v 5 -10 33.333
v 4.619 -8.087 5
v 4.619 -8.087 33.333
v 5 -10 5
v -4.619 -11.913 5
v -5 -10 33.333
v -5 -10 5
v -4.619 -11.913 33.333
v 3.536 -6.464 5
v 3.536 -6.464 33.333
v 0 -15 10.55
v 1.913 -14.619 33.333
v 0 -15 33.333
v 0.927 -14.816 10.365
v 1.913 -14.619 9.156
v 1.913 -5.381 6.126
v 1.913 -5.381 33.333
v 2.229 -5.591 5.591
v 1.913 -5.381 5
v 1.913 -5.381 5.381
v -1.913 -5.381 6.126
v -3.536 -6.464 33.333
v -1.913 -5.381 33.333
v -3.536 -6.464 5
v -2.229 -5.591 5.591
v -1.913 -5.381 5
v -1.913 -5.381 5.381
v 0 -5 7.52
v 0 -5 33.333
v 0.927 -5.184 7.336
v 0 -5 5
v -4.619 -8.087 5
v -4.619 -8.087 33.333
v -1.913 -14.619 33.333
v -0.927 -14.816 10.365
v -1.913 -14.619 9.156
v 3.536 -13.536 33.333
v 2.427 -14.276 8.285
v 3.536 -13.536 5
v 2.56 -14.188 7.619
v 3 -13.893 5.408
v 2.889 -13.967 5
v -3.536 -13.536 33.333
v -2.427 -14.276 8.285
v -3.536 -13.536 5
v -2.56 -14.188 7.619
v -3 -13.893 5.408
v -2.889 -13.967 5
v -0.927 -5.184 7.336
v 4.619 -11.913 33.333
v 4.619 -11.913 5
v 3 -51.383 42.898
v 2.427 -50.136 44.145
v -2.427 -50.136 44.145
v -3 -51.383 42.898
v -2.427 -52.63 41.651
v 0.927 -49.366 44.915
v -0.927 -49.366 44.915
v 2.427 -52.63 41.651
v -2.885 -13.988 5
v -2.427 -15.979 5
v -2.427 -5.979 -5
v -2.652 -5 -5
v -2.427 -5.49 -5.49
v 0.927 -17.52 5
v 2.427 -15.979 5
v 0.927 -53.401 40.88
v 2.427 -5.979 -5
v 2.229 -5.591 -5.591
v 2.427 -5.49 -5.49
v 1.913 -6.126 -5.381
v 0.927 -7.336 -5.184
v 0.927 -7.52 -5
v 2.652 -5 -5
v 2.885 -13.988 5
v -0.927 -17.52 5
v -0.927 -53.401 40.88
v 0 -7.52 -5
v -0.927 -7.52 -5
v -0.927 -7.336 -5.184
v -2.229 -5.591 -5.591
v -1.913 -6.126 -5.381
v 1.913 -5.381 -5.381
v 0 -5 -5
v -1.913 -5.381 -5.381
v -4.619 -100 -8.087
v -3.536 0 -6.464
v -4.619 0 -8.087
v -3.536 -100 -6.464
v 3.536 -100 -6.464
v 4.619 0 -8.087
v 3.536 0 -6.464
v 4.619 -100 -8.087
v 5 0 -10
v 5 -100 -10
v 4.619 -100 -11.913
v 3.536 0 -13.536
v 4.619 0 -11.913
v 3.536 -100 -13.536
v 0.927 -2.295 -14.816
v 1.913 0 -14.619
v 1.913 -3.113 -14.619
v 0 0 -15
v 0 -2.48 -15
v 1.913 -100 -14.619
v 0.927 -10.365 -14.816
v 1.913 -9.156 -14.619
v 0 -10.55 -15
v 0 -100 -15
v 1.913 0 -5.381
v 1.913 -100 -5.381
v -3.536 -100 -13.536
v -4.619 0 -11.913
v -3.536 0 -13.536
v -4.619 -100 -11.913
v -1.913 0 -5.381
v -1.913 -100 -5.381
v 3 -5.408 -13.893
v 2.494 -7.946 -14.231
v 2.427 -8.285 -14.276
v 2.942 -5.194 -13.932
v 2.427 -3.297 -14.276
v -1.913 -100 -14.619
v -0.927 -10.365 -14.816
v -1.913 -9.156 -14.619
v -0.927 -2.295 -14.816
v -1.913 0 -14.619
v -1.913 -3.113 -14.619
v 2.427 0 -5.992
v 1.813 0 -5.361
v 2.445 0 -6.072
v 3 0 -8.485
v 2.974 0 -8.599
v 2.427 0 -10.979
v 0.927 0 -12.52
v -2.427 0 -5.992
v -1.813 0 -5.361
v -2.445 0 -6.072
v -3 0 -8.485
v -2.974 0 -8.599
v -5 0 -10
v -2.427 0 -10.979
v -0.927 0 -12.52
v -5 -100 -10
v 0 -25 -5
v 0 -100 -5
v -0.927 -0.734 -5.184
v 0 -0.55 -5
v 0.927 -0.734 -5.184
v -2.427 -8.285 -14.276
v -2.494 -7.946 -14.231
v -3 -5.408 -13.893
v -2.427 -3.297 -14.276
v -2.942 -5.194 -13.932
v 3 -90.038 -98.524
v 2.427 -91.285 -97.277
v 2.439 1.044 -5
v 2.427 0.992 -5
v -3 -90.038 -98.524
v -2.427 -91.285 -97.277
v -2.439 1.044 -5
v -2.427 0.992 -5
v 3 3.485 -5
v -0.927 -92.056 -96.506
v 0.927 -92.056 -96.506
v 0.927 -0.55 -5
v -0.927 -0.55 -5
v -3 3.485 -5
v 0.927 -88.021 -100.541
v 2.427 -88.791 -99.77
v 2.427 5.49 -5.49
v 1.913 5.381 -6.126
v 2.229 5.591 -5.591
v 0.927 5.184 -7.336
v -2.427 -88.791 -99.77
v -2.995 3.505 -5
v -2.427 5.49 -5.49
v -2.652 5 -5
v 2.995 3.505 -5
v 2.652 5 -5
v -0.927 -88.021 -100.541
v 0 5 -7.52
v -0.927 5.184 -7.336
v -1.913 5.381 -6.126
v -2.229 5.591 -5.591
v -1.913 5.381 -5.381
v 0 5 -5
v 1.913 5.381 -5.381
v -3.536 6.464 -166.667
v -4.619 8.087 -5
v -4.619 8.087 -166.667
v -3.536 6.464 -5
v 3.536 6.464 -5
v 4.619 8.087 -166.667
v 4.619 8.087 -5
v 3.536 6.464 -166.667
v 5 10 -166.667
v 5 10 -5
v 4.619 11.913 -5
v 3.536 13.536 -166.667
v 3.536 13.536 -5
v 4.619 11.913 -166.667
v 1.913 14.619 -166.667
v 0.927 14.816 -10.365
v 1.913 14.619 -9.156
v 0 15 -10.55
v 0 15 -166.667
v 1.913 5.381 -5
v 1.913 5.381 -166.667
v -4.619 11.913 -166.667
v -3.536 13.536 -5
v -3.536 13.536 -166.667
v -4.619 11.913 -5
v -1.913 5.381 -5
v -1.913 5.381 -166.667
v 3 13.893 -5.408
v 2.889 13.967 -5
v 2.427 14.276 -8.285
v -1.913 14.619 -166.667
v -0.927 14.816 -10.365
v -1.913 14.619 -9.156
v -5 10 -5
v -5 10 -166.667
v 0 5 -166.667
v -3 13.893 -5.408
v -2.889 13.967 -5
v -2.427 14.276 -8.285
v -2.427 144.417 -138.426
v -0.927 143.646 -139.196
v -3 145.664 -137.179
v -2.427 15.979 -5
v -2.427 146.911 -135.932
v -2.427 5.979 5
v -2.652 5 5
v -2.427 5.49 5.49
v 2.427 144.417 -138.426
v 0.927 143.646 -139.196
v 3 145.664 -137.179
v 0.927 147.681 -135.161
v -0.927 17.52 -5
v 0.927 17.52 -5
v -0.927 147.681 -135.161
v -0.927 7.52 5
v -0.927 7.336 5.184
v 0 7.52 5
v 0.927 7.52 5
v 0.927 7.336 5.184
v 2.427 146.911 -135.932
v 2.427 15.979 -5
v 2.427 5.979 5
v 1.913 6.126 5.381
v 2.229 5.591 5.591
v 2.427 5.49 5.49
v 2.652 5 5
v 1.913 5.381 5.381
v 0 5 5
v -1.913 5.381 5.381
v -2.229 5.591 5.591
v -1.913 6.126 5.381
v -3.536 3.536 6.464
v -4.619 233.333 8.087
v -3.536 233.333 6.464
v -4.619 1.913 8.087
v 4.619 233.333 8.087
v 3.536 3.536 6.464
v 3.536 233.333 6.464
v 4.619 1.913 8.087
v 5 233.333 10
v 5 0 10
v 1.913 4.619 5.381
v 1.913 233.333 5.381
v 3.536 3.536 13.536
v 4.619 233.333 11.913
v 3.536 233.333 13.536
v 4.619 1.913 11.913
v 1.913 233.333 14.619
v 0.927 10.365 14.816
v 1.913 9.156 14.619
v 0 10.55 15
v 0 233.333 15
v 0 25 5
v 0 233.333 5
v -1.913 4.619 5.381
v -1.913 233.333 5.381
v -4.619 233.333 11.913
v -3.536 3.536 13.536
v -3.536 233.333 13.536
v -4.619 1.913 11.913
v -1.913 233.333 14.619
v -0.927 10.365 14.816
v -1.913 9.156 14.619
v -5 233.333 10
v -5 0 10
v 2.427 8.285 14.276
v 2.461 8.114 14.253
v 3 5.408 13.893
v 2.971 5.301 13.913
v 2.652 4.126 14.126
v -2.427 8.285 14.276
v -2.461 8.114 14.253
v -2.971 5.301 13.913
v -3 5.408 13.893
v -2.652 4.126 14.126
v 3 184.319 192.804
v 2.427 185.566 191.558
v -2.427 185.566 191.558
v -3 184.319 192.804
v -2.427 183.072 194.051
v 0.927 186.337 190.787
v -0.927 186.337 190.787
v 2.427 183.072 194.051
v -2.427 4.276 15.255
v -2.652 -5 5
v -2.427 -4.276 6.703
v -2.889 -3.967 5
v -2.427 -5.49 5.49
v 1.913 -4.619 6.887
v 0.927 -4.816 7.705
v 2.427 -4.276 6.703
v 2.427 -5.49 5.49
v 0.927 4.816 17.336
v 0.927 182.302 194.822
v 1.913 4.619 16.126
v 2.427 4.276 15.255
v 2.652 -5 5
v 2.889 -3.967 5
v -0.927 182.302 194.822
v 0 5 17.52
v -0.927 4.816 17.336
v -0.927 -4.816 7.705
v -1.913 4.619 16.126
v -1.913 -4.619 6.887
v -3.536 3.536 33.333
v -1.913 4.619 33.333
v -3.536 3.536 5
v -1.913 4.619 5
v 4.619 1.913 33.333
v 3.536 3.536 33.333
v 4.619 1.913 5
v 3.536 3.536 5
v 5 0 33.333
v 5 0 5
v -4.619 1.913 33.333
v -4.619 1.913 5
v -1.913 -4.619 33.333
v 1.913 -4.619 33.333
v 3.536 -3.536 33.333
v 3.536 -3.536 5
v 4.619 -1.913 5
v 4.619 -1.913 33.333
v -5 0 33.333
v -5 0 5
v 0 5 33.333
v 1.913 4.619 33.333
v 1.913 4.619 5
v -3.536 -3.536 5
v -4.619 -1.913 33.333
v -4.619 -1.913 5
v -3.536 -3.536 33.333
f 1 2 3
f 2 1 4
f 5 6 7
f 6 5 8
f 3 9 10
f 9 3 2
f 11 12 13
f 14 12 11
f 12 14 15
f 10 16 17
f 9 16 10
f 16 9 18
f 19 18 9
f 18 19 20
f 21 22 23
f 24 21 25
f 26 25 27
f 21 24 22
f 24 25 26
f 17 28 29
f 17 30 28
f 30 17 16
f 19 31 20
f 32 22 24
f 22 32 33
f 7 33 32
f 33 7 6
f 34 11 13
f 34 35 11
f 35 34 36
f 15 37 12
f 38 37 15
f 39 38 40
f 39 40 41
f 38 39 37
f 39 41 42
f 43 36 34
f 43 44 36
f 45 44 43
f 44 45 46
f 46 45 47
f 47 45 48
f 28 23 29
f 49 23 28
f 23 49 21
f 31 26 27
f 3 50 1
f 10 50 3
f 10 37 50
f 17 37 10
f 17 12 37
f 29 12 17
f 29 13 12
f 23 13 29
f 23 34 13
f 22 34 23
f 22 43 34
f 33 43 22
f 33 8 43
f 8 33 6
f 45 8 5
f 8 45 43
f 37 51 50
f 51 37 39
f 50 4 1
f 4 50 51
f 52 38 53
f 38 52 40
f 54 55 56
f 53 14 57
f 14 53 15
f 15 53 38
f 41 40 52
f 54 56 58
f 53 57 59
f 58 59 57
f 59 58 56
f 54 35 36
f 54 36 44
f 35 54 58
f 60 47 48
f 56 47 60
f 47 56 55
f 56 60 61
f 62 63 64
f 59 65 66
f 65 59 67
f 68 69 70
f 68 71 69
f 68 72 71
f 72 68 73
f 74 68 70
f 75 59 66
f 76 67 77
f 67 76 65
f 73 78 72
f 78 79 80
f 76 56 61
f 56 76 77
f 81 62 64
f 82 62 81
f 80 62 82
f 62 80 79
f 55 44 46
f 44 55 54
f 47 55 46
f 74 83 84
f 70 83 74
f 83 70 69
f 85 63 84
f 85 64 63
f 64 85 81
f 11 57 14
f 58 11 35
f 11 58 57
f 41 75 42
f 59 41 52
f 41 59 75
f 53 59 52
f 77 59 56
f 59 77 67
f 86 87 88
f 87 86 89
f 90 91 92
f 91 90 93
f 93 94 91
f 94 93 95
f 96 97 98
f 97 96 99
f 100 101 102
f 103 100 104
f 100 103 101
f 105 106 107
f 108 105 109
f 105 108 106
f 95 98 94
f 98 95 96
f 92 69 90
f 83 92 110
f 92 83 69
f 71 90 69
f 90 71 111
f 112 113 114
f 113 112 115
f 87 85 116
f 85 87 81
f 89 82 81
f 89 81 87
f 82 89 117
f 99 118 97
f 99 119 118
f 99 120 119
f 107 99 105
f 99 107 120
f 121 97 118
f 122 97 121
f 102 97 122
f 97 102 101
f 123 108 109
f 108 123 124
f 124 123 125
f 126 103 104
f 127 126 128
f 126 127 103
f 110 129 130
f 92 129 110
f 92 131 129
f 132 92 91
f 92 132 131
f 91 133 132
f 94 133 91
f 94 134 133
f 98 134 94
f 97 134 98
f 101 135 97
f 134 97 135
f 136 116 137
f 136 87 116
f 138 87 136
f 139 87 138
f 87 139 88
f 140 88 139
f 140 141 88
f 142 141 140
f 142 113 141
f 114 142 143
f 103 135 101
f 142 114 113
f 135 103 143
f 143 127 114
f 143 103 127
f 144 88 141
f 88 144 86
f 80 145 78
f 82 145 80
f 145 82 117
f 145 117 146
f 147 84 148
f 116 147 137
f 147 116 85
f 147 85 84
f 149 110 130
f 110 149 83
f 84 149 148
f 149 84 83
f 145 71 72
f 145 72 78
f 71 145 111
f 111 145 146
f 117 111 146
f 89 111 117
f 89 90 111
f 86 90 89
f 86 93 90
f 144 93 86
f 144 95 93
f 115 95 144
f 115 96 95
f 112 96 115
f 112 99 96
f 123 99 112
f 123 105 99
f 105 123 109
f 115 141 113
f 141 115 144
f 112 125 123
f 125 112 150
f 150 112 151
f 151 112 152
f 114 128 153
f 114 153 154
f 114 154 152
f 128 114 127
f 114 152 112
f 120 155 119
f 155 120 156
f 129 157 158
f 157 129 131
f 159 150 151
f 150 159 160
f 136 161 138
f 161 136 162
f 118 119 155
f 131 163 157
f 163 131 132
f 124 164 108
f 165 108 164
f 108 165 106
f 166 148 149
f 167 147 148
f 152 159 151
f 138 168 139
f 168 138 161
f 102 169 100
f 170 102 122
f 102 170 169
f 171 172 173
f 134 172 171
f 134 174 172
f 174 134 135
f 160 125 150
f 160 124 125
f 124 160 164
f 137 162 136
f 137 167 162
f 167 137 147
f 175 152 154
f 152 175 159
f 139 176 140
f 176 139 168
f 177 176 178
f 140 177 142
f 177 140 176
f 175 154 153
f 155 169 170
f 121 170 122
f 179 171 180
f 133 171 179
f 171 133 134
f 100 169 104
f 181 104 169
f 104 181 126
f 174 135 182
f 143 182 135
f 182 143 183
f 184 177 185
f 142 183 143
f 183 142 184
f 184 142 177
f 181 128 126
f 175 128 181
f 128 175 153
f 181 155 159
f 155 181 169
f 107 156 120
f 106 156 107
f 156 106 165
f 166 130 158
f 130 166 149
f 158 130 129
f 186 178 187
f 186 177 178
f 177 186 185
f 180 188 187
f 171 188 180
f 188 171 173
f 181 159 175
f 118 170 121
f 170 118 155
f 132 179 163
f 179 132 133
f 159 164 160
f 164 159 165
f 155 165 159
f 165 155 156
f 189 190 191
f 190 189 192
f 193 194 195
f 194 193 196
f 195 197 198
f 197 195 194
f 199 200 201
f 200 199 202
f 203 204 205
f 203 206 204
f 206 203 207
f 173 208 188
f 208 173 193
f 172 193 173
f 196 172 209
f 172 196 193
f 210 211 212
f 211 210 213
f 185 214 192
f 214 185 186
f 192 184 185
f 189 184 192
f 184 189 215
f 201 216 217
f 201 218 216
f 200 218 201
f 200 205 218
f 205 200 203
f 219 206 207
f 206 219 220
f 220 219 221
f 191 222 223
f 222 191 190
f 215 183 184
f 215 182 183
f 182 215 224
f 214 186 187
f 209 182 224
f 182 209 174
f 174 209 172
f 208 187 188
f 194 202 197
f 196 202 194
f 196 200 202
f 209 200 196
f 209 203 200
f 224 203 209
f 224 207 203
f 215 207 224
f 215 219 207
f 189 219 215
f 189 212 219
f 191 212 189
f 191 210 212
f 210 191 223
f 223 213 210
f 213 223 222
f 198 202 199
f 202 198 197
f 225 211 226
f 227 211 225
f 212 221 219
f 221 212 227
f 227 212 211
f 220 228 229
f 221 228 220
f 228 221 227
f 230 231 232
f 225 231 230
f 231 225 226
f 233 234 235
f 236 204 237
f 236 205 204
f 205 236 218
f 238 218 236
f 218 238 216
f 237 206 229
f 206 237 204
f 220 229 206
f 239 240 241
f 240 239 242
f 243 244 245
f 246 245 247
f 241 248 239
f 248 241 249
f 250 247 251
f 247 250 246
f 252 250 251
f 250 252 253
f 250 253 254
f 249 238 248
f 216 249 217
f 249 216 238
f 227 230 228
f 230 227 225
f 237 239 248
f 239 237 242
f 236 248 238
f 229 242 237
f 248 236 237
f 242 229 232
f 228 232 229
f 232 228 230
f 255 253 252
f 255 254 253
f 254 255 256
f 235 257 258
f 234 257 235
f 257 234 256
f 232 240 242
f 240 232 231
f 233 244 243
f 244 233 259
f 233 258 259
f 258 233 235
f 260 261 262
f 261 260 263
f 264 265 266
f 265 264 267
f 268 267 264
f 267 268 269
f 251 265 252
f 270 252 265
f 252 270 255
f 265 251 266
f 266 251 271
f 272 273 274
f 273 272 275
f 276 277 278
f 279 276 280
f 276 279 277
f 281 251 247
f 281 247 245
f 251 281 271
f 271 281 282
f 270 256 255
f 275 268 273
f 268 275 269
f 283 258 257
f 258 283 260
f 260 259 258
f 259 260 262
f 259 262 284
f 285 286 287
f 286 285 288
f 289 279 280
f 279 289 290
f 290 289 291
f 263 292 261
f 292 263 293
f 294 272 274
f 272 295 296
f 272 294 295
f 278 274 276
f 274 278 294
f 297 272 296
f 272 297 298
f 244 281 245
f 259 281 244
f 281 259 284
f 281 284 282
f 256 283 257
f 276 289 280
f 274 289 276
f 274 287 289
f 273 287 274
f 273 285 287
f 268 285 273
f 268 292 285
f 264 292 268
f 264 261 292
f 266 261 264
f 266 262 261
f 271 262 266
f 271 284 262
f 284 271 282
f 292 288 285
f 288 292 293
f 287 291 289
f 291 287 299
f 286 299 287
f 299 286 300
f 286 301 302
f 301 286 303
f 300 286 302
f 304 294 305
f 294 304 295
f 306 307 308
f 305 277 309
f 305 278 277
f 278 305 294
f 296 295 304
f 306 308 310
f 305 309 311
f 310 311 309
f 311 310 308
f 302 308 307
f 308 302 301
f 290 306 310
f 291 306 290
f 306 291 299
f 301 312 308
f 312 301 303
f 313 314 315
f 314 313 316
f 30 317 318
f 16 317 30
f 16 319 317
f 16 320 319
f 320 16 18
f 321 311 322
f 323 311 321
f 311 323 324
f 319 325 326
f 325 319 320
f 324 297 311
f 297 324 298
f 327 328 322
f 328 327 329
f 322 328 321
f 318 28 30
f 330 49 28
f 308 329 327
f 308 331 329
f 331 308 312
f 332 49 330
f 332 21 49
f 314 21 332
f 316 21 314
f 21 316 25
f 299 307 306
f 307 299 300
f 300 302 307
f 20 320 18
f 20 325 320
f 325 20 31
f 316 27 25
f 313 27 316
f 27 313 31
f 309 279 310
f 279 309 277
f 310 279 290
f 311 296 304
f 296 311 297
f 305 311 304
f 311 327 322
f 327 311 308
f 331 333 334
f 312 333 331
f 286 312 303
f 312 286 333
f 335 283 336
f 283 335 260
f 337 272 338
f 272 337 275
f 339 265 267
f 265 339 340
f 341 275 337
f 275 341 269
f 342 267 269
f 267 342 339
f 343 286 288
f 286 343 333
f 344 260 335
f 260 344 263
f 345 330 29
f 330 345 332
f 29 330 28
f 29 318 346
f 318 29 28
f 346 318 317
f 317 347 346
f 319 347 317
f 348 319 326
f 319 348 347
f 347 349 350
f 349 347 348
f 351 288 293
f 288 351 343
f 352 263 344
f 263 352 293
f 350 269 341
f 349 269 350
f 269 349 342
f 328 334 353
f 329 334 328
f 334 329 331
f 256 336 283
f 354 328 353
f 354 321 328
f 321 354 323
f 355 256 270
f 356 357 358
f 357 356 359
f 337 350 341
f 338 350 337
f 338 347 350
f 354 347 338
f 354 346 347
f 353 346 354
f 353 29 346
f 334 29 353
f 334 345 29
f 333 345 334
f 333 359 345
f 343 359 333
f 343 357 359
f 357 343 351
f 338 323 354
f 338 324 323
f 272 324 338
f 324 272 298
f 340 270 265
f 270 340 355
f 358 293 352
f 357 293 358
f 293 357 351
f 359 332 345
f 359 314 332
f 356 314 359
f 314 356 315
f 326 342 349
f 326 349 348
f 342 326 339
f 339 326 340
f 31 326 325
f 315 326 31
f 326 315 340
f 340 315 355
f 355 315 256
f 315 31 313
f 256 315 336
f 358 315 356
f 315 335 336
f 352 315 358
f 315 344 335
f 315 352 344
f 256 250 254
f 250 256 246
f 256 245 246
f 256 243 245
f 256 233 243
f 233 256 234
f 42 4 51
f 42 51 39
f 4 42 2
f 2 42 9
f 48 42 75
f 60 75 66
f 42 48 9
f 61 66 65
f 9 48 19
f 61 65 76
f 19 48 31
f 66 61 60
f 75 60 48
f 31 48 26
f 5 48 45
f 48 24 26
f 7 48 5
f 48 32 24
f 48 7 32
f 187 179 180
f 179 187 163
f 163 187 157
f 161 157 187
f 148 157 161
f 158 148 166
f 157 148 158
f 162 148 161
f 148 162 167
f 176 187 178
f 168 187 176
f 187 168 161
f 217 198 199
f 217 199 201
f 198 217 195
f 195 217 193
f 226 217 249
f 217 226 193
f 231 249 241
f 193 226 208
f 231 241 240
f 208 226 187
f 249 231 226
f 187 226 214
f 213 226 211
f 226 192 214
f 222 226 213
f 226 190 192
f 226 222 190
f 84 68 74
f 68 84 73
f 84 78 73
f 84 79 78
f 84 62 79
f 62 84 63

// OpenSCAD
// Generated by CadMonkey
// Prompt: hey cadmonkey, create me a tree
// Generated at: 2025-11-10 21:30:33

// Tree parameters
tree_height = 100;
trunk_radius = 5;
branch_angle = 20;
branch_length = 25;
num_branches = 8;

module trunk(height, radius) {
    cylinder(h=height, r=radius);
}

module branch(length, angle, radius) {
    rotate([angle,0,0])
        translate([0,-radius*2,0])
            cylinder(h=length, r=radius);
}


difference() {
    union(){
        // Trunk
        trunk(tree_height/3, trunk_radius);

        // Branches
        for (i = [0:num_branches-1]) {
            angle = i * 360 / num_branches;
            branch_len = tree_height/3 + i * tree_height/3;
            
            branch(branch_len, angle, trunk_radius - (i % 2)*2);
        }
        
    }

    // Remove the base of the tree to make it flat. 
    cube([50,50,10], center=true); // Remove the base
    
}
